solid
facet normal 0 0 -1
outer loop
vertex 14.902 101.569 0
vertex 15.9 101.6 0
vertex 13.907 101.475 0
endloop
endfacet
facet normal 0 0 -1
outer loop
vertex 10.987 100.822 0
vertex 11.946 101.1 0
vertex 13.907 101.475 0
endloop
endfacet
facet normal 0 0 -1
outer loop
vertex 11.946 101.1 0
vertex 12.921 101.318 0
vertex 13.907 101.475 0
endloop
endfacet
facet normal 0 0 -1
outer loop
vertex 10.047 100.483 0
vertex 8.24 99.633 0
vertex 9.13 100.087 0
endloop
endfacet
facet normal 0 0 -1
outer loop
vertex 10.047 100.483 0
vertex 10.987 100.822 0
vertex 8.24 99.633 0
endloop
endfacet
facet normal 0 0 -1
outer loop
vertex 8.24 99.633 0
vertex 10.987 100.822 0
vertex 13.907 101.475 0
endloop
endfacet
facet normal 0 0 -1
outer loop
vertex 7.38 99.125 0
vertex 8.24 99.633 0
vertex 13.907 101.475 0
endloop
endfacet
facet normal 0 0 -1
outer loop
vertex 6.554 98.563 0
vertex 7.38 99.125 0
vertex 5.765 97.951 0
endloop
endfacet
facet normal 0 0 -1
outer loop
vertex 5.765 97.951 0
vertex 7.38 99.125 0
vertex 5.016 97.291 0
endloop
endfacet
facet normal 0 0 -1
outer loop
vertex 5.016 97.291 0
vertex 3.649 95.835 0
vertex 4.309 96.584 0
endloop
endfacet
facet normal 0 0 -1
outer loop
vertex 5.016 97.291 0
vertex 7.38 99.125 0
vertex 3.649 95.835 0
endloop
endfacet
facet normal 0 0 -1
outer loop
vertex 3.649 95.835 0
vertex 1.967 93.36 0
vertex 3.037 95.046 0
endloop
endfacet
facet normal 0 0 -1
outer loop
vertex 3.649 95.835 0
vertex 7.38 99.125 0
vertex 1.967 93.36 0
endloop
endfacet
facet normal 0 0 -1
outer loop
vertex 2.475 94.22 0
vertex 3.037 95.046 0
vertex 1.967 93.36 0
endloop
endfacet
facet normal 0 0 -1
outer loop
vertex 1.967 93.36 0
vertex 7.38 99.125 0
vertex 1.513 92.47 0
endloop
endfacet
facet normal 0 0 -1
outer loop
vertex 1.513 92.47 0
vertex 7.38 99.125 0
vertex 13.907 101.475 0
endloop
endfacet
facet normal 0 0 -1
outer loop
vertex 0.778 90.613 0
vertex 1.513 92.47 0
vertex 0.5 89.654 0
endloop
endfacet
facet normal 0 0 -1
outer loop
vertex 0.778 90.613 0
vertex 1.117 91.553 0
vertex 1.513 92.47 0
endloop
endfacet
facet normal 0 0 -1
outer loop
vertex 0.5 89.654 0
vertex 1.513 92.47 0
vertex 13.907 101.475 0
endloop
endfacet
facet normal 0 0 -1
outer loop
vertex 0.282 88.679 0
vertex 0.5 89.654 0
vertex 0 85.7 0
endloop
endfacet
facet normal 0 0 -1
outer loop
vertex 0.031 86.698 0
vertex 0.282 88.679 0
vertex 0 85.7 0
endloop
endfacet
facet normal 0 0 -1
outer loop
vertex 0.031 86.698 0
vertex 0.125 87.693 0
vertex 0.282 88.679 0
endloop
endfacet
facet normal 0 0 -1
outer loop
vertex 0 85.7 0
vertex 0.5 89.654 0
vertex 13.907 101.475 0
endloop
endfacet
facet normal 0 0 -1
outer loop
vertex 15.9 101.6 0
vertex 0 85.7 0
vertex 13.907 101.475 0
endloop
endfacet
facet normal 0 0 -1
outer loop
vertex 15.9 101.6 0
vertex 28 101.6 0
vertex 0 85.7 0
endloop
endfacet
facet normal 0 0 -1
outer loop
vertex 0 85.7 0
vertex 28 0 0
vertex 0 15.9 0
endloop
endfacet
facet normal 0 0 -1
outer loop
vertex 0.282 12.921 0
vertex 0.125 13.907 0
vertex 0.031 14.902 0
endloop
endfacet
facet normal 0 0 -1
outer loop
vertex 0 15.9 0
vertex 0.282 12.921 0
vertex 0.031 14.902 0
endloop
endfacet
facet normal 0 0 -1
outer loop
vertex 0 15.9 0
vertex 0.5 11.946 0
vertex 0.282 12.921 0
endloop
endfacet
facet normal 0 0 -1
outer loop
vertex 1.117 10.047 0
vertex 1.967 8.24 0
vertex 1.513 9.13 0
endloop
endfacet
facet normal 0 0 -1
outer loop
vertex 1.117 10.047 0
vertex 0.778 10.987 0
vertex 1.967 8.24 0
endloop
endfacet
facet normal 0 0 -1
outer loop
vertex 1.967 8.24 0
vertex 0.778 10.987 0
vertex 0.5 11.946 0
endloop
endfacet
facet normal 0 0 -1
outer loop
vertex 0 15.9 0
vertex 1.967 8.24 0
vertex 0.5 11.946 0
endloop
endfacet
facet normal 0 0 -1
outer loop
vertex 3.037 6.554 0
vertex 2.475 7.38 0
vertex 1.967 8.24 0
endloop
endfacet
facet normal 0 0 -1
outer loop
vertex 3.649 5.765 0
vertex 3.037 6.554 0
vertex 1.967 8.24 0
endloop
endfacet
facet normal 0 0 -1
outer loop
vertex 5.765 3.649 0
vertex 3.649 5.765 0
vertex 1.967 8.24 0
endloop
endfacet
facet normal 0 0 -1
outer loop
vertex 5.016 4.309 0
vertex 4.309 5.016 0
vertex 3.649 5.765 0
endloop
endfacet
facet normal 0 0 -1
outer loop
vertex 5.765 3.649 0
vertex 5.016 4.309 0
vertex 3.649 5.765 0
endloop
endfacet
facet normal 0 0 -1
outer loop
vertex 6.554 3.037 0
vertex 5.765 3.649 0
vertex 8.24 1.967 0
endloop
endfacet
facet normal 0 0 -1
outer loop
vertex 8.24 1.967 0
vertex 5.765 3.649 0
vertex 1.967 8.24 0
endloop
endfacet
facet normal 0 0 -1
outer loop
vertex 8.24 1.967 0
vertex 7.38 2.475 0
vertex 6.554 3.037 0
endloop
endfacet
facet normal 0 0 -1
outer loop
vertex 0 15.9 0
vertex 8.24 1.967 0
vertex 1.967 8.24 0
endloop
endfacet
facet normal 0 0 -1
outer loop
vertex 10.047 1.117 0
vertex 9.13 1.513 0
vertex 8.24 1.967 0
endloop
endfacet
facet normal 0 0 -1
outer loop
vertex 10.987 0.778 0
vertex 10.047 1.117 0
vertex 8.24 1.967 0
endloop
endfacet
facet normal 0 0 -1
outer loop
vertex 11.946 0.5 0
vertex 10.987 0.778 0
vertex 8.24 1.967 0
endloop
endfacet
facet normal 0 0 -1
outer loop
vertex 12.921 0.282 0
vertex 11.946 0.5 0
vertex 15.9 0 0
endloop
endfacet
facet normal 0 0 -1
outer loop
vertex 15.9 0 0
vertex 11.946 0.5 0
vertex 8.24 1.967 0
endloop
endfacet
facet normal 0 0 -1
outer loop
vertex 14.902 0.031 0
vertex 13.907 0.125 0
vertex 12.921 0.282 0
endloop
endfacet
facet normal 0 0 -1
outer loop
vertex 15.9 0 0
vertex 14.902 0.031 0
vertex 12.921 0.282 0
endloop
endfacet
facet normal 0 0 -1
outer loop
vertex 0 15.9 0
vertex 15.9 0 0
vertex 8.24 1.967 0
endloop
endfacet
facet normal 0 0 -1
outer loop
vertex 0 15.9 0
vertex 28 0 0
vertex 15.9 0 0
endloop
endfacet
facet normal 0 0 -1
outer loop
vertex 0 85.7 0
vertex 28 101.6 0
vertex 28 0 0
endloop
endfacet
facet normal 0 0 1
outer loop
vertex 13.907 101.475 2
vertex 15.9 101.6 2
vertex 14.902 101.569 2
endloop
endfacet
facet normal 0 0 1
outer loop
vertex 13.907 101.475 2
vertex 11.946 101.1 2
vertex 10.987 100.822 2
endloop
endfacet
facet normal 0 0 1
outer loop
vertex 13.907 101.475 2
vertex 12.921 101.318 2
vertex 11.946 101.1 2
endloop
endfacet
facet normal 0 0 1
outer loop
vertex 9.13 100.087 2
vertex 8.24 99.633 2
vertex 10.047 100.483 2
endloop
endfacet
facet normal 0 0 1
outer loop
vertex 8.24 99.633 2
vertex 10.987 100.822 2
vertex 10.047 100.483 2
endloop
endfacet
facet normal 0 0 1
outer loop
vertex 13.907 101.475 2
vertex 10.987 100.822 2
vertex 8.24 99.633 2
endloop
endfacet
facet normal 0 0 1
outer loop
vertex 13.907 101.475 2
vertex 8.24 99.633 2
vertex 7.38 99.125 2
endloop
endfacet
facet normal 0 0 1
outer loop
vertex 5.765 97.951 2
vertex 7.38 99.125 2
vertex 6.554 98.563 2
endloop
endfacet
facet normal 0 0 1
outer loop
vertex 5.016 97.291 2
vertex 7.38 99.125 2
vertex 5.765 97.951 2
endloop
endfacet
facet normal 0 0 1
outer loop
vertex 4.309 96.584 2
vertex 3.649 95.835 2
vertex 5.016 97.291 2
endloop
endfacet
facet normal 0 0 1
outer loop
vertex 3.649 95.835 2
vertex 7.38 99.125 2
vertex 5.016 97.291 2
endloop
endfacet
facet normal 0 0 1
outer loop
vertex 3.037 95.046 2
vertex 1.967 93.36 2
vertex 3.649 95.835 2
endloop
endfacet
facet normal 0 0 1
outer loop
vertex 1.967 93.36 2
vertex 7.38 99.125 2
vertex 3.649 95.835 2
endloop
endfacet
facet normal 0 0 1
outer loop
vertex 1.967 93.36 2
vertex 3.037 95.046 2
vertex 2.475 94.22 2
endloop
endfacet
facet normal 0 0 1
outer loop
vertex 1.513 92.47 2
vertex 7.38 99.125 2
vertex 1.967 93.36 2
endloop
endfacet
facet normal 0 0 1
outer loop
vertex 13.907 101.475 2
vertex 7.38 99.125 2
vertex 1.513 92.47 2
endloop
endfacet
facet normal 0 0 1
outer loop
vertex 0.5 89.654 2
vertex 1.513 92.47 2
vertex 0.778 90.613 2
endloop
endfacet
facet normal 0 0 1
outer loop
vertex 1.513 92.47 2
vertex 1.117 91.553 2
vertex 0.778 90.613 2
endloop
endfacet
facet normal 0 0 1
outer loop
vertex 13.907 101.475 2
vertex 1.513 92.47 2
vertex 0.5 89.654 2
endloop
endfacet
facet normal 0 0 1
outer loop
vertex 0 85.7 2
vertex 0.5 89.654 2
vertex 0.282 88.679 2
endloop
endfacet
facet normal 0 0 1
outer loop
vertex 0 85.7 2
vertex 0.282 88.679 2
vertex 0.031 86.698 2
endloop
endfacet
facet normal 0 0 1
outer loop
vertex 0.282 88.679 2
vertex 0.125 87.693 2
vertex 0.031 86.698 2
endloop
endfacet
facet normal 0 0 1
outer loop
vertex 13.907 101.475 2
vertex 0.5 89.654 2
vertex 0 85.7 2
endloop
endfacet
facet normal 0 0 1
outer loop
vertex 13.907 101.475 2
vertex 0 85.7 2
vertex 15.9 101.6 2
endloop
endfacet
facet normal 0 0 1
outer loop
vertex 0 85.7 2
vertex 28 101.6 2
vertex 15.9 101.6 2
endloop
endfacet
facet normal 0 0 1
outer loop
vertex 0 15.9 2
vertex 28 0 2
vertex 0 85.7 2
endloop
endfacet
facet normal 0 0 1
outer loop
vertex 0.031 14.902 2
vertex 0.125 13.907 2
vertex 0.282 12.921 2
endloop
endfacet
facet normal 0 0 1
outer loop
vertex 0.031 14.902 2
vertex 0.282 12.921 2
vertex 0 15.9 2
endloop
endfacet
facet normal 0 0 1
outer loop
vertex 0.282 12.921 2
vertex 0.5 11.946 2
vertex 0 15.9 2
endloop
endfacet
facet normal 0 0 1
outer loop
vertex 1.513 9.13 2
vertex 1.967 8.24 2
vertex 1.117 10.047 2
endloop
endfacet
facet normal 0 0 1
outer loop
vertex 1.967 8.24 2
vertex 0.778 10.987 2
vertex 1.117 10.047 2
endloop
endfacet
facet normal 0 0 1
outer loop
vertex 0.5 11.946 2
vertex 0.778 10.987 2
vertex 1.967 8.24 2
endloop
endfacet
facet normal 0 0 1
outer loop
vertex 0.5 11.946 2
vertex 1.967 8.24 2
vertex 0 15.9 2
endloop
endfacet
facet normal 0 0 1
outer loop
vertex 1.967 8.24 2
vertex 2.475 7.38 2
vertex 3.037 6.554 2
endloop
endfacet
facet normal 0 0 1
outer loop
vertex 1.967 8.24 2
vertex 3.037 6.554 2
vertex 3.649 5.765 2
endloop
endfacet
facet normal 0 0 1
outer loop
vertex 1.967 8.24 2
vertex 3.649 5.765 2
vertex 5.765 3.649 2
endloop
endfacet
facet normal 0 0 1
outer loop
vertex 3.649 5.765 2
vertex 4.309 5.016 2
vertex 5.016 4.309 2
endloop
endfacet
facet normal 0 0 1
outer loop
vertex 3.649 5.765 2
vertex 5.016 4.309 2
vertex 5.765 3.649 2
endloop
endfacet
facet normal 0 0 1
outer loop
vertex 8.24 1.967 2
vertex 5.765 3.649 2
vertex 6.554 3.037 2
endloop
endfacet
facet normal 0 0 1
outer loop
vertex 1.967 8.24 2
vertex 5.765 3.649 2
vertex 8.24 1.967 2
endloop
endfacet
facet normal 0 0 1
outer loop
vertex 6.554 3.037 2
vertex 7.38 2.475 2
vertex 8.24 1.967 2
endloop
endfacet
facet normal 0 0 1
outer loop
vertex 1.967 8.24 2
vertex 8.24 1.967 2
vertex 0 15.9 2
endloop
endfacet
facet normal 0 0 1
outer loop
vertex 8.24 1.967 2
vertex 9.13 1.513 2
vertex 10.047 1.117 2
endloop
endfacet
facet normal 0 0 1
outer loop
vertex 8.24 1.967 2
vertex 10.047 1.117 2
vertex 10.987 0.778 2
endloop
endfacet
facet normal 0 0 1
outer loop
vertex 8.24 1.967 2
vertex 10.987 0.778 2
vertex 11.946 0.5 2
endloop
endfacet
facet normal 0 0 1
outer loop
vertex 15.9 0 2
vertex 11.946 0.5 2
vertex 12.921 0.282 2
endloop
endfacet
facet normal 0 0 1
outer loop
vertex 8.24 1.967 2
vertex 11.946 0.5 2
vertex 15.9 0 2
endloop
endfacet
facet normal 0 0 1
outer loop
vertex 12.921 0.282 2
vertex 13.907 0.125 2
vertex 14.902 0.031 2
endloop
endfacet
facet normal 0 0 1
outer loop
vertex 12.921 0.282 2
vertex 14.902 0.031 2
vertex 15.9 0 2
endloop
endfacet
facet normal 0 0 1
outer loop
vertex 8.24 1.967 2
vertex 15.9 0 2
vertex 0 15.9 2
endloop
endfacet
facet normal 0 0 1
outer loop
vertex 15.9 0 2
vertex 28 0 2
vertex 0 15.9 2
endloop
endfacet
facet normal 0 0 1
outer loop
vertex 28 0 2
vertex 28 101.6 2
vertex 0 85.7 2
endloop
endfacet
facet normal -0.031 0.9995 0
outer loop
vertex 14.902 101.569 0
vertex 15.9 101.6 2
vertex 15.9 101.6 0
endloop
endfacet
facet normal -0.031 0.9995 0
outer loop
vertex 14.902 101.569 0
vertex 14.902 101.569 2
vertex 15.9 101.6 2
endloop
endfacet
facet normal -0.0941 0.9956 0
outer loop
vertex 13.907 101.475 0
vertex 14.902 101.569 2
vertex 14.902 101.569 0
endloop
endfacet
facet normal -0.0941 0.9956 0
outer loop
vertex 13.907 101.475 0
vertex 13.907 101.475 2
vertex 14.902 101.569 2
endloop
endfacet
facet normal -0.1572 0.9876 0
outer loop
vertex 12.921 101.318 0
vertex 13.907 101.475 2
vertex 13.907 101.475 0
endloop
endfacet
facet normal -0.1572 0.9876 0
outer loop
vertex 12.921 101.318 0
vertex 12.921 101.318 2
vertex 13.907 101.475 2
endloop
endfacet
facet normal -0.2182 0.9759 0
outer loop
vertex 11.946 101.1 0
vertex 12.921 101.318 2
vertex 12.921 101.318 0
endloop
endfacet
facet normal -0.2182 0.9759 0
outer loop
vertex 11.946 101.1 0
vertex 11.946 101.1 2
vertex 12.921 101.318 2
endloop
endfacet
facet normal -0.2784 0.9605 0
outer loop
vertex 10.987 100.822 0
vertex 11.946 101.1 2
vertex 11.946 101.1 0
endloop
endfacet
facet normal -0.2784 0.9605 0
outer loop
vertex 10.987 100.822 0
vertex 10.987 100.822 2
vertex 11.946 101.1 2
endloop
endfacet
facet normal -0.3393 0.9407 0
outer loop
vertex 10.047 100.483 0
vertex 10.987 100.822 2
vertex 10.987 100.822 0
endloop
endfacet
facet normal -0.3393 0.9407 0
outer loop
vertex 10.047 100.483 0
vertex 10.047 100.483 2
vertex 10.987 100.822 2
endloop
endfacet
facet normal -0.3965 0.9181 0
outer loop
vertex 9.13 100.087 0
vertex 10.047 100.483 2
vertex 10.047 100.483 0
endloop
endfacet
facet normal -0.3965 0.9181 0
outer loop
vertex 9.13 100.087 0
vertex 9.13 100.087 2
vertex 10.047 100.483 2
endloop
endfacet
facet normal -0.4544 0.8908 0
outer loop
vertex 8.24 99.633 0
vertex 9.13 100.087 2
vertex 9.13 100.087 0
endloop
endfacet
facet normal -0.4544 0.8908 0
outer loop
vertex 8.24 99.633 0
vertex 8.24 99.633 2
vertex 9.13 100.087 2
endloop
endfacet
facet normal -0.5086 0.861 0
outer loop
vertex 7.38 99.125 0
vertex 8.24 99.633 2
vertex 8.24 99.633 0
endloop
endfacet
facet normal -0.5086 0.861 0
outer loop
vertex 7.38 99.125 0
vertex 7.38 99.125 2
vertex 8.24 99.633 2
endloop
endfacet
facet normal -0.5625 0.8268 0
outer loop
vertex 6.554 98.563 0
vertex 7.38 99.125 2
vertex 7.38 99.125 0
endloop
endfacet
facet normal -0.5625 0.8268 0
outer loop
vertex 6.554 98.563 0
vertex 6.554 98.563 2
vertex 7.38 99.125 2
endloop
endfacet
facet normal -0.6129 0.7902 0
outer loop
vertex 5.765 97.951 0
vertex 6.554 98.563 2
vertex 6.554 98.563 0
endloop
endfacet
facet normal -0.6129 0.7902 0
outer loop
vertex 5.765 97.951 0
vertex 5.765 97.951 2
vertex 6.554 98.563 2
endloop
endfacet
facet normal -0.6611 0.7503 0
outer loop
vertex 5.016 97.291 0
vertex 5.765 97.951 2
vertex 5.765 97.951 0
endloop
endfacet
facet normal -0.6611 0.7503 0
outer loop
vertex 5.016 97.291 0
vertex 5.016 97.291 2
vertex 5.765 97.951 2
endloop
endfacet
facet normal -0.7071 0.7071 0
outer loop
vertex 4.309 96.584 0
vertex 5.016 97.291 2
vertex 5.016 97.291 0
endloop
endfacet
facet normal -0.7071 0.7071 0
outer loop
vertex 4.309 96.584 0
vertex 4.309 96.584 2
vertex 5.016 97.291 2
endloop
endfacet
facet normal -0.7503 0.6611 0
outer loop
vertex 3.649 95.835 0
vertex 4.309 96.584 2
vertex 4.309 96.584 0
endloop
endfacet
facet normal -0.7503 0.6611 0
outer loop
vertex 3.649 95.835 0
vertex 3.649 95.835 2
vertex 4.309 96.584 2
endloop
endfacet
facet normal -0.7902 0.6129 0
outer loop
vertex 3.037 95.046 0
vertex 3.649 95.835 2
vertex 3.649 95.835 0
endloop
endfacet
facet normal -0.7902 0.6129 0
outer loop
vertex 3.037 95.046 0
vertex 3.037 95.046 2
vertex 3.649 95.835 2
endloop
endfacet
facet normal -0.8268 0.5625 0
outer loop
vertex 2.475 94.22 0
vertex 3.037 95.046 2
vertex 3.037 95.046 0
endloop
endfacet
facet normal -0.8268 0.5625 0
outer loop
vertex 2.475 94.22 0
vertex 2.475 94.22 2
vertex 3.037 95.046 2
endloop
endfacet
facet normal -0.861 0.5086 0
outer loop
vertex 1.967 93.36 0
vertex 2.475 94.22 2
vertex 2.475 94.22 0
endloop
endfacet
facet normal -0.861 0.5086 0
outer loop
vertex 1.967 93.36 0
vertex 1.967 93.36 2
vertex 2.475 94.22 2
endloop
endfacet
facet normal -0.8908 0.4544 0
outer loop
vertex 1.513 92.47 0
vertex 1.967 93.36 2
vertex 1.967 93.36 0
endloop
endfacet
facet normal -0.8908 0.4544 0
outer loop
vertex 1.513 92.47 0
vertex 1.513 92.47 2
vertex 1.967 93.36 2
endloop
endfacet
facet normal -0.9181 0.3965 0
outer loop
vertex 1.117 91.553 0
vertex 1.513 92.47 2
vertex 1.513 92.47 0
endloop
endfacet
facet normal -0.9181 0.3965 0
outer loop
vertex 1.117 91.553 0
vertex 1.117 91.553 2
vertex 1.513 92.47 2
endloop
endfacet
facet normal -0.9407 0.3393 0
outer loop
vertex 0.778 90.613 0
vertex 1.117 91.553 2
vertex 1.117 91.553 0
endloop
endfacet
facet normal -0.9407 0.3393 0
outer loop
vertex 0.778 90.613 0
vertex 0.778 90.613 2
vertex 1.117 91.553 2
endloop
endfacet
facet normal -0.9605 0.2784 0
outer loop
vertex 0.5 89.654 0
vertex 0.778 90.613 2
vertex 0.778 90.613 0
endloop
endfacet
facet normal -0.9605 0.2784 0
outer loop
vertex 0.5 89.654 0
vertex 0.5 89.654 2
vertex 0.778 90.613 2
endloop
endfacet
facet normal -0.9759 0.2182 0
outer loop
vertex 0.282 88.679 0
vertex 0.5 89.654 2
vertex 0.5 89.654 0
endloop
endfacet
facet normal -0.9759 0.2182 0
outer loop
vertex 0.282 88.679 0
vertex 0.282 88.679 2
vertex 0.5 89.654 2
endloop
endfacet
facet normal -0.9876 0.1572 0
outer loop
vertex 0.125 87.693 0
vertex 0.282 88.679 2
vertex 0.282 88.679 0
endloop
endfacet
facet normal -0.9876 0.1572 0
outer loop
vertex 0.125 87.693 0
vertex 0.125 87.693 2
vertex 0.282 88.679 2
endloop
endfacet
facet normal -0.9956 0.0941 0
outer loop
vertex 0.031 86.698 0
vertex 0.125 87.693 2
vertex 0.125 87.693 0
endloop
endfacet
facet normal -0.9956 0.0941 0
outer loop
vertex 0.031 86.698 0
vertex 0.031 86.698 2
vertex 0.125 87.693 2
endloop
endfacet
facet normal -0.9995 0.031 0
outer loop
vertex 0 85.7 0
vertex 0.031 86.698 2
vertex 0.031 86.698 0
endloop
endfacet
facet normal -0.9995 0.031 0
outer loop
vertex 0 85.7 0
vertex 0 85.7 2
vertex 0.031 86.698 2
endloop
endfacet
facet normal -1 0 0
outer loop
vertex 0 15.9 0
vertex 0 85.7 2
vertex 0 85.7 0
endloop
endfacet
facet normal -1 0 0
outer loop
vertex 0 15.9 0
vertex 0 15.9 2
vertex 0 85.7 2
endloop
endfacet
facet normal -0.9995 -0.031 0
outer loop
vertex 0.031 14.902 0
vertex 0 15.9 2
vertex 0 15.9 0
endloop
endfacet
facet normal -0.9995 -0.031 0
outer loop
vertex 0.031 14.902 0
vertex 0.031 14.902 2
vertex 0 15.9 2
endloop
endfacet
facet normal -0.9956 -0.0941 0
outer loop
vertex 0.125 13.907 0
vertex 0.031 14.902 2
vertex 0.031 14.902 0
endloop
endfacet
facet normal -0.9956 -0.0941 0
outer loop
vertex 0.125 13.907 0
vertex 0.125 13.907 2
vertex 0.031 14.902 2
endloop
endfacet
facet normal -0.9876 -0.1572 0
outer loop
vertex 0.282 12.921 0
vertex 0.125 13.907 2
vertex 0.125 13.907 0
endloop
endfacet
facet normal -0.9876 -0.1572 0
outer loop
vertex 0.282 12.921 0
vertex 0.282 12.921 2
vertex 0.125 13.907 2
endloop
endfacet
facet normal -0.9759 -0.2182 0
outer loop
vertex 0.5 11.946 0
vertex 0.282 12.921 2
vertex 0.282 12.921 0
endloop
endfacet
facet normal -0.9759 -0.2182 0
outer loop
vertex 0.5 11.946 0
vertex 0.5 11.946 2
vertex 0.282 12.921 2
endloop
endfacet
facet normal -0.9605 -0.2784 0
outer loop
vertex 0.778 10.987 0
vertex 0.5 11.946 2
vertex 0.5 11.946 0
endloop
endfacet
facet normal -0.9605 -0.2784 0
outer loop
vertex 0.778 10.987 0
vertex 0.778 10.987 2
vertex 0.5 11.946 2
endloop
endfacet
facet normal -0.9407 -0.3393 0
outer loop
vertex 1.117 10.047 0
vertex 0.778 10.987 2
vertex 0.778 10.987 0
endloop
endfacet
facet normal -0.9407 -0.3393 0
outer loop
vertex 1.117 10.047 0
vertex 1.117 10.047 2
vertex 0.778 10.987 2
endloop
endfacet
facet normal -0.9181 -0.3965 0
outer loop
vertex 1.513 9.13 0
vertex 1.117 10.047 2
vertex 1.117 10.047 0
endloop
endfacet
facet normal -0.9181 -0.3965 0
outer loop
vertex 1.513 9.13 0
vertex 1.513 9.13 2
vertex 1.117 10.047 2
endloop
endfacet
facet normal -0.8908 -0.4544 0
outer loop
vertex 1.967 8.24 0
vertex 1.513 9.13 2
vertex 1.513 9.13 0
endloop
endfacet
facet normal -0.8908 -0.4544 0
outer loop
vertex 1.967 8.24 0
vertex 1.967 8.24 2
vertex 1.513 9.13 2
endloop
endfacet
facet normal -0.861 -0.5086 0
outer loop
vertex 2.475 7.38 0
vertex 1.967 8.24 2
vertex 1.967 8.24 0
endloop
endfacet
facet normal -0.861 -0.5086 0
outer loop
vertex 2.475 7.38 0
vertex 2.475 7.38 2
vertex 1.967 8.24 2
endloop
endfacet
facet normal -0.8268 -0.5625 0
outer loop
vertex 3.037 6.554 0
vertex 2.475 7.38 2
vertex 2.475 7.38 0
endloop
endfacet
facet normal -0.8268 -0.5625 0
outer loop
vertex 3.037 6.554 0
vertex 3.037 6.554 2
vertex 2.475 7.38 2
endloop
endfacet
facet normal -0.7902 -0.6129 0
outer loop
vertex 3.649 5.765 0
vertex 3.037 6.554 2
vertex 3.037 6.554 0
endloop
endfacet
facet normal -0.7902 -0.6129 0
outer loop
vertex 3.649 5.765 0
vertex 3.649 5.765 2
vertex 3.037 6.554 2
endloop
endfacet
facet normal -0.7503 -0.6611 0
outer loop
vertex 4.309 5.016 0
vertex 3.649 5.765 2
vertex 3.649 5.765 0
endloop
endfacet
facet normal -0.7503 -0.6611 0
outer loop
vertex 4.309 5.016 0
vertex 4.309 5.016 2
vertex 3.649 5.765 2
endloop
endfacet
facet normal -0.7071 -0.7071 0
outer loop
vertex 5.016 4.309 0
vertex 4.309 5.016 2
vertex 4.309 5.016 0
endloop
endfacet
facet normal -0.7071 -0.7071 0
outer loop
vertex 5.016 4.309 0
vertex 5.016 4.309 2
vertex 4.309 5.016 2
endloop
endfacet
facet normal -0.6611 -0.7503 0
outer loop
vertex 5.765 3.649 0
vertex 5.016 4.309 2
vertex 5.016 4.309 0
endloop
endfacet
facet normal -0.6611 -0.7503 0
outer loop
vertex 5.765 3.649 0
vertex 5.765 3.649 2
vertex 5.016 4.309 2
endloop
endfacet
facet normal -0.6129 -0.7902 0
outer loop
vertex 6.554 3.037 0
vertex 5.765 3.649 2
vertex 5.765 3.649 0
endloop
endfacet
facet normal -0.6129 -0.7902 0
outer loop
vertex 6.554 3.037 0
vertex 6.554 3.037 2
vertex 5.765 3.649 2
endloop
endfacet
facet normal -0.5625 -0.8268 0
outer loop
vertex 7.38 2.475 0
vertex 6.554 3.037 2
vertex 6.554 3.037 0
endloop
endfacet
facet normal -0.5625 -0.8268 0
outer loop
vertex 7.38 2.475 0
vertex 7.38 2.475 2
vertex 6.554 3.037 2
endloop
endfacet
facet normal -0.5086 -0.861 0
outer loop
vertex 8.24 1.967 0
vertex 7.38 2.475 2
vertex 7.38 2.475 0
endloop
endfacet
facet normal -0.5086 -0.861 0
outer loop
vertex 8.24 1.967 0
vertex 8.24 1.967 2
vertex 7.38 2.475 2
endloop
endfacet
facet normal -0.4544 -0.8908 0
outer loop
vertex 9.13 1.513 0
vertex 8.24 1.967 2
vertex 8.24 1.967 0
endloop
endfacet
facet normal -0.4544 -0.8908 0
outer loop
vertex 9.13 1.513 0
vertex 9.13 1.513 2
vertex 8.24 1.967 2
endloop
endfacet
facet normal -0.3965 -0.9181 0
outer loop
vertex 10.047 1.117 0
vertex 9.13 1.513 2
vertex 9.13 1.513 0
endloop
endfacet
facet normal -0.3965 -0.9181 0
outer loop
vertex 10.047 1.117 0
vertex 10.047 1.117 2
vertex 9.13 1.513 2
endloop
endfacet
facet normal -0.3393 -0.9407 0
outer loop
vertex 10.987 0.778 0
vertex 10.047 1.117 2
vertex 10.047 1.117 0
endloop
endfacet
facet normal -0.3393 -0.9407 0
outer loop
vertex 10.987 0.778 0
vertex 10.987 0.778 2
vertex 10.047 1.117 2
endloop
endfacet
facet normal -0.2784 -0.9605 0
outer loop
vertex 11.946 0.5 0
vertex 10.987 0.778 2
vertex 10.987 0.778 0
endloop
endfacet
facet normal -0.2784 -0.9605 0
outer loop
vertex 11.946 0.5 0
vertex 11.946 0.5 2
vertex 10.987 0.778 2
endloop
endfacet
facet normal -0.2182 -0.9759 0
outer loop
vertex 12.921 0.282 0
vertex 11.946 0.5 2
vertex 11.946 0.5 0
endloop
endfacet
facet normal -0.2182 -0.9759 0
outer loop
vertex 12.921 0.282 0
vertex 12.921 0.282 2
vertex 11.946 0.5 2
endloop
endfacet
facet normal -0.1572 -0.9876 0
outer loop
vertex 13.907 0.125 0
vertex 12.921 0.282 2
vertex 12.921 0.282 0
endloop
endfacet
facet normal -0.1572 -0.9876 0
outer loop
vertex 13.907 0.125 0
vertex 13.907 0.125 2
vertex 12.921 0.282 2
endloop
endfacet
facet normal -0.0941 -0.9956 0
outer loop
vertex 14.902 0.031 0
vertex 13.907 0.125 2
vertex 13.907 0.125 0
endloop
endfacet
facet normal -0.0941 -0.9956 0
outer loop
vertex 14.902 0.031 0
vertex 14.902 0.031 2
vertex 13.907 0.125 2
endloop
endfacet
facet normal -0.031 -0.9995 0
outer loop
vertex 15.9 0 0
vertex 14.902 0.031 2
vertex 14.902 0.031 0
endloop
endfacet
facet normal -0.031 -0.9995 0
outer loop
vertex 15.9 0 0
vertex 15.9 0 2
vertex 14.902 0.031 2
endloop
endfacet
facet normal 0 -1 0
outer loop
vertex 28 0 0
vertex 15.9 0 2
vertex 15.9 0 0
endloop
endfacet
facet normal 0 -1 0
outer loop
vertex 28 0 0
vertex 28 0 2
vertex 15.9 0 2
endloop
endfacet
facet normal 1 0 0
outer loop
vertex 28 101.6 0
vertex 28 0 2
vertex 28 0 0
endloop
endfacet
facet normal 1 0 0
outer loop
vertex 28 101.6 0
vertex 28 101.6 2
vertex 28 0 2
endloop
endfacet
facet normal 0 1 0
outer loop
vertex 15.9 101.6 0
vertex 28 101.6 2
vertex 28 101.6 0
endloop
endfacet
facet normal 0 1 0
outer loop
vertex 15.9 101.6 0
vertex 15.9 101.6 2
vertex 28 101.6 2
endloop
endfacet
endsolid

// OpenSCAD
$fn=100;
/*
// Latch Plate
radius=25.4*0.25;
width=30;
height=2.25*25.4;
*/

radius=15.9;
width=28;
height=4*25.4;

linear_extrude(2) union() {
    difference() {
        union() {
            translate([radius, radius, 0]) circle(r=radius);
            translate([radius, height-radius, 0]) circle(r=radius);
        }
        translate([width, 0, 0]) square([width, height]);
    }
    translate([0, radius, 0]) square([width, height-(radius*2)]);
    translate([radius, 0, 0]) square([width-radius, height]);
}
